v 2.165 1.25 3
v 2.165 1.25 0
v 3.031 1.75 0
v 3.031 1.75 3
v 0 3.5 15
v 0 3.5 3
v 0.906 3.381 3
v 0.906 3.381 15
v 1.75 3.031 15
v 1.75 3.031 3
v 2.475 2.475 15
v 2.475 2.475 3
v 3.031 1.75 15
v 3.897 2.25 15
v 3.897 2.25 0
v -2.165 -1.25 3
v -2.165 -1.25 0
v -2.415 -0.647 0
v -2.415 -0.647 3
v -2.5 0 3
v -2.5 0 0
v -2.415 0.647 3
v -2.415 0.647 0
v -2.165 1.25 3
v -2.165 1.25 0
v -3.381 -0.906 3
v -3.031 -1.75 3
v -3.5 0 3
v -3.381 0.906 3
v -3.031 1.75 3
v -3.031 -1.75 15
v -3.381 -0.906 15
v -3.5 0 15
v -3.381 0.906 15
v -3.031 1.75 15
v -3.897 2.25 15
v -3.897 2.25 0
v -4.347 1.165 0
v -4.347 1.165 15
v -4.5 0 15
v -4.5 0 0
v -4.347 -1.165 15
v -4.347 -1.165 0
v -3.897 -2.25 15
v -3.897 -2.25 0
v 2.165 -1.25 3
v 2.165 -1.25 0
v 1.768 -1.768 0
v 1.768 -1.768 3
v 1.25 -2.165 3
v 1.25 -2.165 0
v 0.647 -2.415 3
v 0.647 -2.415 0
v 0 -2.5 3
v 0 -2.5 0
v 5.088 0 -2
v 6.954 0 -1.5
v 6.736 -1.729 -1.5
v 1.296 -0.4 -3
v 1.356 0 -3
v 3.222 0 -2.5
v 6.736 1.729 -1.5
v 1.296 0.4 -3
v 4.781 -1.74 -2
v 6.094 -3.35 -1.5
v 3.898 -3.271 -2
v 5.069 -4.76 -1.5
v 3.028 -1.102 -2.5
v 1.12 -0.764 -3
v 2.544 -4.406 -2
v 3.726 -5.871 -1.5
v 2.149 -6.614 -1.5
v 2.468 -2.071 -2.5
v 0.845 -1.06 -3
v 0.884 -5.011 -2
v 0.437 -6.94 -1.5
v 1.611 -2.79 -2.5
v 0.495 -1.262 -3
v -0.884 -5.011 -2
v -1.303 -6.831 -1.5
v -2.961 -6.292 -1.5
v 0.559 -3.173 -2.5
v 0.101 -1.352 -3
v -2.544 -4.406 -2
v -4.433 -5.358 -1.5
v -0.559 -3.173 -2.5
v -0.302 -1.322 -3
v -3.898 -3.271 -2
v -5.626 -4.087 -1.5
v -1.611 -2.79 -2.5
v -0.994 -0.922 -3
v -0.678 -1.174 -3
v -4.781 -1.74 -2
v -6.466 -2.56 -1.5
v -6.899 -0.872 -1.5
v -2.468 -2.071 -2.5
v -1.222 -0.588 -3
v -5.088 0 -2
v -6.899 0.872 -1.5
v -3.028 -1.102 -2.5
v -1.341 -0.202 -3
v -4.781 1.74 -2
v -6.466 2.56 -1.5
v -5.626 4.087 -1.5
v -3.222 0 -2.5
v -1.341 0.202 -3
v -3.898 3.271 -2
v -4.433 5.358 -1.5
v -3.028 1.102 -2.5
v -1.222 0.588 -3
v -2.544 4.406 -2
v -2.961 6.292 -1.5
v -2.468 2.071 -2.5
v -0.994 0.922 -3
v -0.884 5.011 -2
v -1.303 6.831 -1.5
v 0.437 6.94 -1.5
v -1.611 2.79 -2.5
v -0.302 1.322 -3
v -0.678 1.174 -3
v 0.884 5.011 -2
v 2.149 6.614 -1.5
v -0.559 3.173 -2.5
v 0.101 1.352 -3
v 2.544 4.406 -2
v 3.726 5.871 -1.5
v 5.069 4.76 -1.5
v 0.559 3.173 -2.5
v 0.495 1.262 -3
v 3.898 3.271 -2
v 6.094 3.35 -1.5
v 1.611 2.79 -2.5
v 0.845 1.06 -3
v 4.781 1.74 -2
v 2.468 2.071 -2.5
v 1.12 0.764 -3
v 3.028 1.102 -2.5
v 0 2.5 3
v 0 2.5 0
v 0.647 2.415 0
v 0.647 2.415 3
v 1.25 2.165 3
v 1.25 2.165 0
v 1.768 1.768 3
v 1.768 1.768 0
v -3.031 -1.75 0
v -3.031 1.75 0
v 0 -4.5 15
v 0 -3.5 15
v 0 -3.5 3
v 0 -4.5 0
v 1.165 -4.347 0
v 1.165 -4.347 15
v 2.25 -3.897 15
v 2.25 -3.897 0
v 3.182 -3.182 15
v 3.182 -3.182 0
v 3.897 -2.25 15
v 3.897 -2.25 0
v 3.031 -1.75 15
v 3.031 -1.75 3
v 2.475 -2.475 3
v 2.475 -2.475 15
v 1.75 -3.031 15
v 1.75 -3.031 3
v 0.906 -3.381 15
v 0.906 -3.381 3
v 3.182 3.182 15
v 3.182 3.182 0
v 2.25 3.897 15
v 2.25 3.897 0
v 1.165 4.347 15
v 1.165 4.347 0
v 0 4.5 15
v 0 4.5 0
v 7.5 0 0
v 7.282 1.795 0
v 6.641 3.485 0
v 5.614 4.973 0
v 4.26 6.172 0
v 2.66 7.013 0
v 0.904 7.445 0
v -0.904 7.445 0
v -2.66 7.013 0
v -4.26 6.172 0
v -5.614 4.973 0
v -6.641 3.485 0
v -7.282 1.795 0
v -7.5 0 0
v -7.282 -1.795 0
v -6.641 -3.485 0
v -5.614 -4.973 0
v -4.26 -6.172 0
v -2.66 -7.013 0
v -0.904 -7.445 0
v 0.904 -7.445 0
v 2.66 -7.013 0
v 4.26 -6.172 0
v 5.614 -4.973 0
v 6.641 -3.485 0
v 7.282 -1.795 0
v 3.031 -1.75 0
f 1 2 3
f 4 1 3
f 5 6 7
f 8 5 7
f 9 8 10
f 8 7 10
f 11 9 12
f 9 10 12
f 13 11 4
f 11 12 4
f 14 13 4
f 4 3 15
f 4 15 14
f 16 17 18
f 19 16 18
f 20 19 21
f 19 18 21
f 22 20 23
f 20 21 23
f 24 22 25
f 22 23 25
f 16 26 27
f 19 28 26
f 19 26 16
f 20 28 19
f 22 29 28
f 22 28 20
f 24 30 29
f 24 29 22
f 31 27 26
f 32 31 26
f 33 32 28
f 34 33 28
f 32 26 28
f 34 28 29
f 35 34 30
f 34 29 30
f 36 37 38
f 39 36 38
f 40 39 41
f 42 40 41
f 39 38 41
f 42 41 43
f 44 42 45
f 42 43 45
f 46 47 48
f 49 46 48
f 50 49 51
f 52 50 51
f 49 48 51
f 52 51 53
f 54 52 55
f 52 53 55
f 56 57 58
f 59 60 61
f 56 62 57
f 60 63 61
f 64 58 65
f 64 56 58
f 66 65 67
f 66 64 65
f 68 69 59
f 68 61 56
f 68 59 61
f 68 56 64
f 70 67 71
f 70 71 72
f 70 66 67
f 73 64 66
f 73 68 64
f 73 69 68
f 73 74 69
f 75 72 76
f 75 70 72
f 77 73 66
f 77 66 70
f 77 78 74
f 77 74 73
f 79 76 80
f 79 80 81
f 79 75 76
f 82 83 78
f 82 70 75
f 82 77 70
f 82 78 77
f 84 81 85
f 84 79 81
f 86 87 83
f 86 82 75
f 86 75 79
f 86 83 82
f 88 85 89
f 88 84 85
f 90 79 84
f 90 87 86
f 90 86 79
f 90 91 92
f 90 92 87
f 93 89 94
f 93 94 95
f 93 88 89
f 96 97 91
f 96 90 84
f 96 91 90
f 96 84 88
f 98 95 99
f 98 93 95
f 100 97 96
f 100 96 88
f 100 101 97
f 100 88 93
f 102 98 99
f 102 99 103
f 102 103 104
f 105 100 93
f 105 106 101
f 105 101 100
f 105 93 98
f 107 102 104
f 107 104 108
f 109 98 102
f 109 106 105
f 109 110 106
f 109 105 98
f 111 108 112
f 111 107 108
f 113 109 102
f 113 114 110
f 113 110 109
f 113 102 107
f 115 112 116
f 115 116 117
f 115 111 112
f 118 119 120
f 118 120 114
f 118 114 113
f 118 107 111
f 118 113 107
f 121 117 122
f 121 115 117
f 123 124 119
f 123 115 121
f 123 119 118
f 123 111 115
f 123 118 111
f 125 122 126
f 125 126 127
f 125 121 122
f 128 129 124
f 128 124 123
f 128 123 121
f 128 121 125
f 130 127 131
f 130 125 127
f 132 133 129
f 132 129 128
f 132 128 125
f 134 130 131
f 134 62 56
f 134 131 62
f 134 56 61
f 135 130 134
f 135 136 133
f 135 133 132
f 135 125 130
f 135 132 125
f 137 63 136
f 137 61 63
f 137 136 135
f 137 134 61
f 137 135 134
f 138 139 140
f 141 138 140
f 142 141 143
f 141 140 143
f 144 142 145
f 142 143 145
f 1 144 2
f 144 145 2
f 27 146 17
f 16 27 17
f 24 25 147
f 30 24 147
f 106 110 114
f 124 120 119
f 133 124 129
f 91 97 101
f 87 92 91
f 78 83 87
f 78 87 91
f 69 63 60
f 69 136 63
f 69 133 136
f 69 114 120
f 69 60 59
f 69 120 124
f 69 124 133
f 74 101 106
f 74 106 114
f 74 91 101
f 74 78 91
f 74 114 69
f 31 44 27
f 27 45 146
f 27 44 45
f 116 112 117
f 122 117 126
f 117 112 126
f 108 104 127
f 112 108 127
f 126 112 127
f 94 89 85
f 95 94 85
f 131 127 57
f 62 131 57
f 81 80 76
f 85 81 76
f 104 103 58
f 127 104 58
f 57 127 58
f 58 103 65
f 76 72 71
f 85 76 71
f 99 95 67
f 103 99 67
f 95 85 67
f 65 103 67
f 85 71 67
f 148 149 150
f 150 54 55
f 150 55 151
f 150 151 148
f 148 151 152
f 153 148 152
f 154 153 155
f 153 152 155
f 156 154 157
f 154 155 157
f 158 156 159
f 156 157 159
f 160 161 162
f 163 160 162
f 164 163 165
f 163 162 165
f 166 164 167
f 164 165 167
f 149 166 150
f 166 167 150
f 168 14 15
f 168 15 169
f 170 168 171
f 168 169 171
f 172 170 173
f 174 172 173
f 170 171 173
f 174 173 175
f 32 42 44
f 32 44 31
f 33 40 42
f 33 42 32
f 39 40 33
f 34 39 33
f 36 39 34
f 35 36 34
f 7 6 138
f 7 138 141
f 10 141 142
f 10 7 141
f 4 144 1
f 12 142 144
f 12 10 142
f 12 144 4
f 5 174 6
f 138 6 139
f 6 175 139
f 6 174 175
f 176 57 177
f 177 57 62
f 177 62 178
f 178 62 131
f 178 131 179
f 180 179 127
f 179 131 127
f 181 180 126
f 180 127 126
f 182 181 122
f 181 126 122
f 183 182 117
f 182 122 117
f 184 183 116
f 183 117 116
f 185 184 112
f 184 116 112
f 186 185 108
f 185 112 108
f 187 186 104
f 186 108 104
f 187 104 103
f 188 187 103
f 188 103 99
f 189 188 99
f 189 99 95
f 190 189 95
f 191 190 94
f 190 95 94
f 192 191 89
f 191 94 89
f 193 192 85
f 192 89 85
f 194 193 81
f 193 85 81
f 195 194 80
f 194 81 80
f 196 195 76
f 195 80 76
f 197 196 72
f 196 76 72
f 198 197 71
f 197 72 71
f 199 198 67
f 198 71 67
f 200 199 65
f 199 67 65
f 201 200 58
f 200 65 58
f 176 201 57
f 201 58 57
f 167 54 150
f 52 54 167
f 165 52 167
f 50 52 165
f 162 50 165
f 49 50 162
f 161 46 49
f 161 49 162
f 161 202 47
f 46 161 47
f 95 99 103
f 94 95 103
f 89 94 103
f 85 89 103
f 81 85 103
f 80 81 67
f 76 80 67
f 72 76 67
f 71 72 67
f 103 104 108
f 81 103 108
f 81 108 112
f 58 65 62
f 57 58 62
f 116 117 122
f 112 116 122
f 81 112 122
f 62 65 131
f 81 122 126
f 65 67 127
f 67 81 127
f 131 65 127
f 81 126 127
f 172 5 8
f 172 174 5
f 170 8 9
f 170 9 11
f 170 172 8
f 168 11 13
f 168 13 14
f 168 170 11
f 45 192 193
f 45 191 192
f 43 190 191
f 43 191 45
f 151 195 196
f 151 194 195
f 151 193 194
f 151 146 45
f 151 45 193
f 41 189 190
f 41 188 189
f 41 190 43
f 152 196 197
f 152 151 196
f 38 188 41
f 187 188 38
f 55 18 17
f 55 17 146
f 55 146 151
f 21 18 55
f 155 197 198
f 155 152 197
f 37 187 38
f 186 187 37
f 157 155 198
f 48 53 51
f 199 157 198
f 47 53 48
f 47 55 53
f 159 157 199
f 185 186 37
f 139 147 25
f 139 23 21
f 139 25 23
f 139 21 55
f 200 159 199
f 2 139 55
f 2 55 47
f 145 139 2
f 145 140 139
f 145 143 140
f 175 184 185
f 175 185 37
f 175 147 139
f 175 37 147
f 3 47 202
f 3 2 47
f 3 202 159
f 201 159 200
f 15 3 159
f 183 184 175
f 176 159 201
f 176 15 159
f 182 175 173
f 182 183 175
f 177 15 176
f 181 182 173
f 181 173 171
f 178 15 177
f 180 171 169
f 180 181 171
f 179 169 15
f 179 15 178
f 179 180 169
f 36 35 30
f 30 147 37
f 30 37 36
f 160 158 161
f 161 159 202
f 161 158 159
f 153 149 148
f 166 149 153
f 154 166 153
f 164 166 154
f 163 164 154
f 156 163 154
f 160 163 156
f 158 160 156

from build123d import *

# Parameters (mm, degrees)
F0_R      = 7.5
F1_DEPTH  = 1.5
F1_TAPER  = 20
F2_DEPTH  = 3
F3_DEPTH  = 15
F1_FACE_R = 6.9540446486
F4_DEPTH  = 1.5
F4_TAPER  = 75


with BuildPart() as f1:
    # F0 (on Top) → F1 (new body)
    with BuildSketch(Plane.XY):
        Circle(F0_R)
        with BuildLine():
            ThreePointArc((0, 4.5), (2.25, 3.897114317), (3.897114317, 2.25))
            ThreePointArc((3.897114317, 2.25), (4.3466662183, 1.164685703), (4.5, 0))
            ThreePointArc((4.5, 0), (4.3466662183, -1.164685703), (3.897114317, -2.25))
            ThreePointArc((3.897114317, -2.25), (2.25, -3.897114317), (0, -4.5))
            ThreePointArc((0, -4.5), (-2.25, -3.897114317), (-3.897114317, -2.25))
            ThreePointArc((-3.897114317, -2.25), (-4.5, 0), (-3.897114317, 2.25))
            ThreePointArc((-3.897114317, 2.25), (-2.25, 3.897114317), (0, 4.5))
        make_face(mode=Mode.SUBTRACT)
        with BuildLine():
            Line((3.897114317, -2.25), (3.0310889132, -1.75))
            ThreePointArc((3.0310889132, -1.75), (1.75, -3.0310889132), (0, -3.5))
            Line((0, -3.5), (0, -4.5))
            ThreePointArc((0, -4.5), (2.25, -3.897114317), (3.897114317, -2.25))
        make_face()
        with BuildLine():
            ThreePointArc((0, -3.5), (1.75, -3.0310889132), (3.0310889132, -1.75))
            Line((3.0310889132, -1.75), (2.1650635095, -1.25))
            ThreePointArc((2.1650635095, -1.25), (1.25, -2.1650635095), (0, -2.5))
            Line((0, -2.5), (0, -3.5))
        make_face()
        with BuildLine():
            ThreePointArc((-3.0310889132, -1.75), (-1.75, -3.0310889132), (0, -3.5))
            Line((0, -3.5), (0, -2.5))
            ThreePointArc((0, -2.5), (-1.25, -2.1650635095), (-2.1650635095, -1.25))
            Line((-2.1650635095, -1.25), (-3.0310889132, -1.75))
        make_face()
        with BuildLine():
            Line((0, -4.5), (0, -3.5))
            ThreePointArc((0, -3.5), (-1.75, -3.0310889132), (-3.0310889132, -1.75))
            Line((-3.0310889132, -1.75), (-3.897114317, -2.25))
            ThreePointArc((-3.897114317, -2.25), (-2.25, -3.897114317), (0, -4.5))
        make_face()
        with BuildLine():
            ThreePointArc((-3.0310889132, -1.75), (-3.5, 0), (-3.0310889132, 1.75))
            Line((-3.0310889132, 1.75), (-3.897114317, 2.25))
            ThreePointArc((-3.897114317, 2.25), (-4.5, 0), (-3.897114317, -2.25))
            Line((-3.897114317, -2.25), (-3.0310889132, -1.75))
        make_face()
        with BuildLine():
            Line((-2.1650635095, 1.25), (-3.0310889132, 1.75))
            ThreePointArc((-3.0310889132, 1.75), (-3.5, 0), (-3.0310889132, -1.75))
            Line((-3.0310889132, -1.75), (-2.1650635095, -1.25))
            ThreePointArc((-2.1650635095, -1.25), (-2.5, 0), (-2.1650635095, 1.25))
        make_face()
        with BuildLine():
            ThreePointArc((-3.0310889132, 1.75), (-1.75, 3.0310889132), (0, 3.5))
            Line((0, 3.5), (0, 4.5))
            ThreePointArc((0, 4.5), (-2.25, 3.897114317), (-3.897114317, 2.25))
            Line((-3.897114317, 2.25), (-3.0310889132, 1.75))
        make_face()
        with BuildLine():
            Line((0, 2.5), (0, 3.5))
            ThreePointArc((0, 3.5), (-1.75, 3.0310889132), (-3.0310889132, 1.75))
            Line((-3.0310889132, 1.75), (-2.1650635095, 1.25))
            ThreePointArc((-2.1650635095, 1.25), (-1.25, 2.1650635095), (0, 2.5))
        make_face()
        with BuildLine():
            ThreePointArc((0, 3.5), (1.75, 3.0310889132), (3.0310889132, 1.75))
            Line((3.0310889132, 1.75), (3.897114317, 2.25))
            ThreePointArc((3.897114317, 2.25), (2.25, 3.897114317), (0, 4.5))
            Line((0, 4.5), (0, 3.5))
        make_face()
        with BuildLine():
            Line((2.1650635095, 1.25), (3.0310889132, 1.75))
            ThreePointArc((3.0310889132, 1.75), (1.75, 3.0310889132), (0, 3.5))
            Line((0, 3.5), (0, 2.5))
            ThreePointArc((0, 2.5), (1.25, 2.1650635095), (2.1650635095, 1.25))
        make_face()
        with BuildLine():
            ThreePointArc((3.0310889132, 1.75), (3.380740392, 0.9058666579), (3.5, 0))
            ThreePointArc((3.5, 0), (3.380740392, -0.9058666579), (3.0310889132, -1.75))
            Line((3.0310889132, -1.75), (3.897114317, -2.25))
            ThreePointArc((3.897114317, -2.25), (4.3466662183, -1.164685703), (4.5, 0))
            ThreePointArc((4.5, 0), (4.3466662183, 1.164685703), (3.897114317, 2.25))
            Line((3.897114317, 2.25), (3.0310889132, 1.75))
        make_face()
        with BuildLine():
            ThreePointArc((3.0310889132, -1.75), (3.380740392, -0.9058666579), (3.5, 0))
            ThreePointArc((3.5, 0), (3.380740392, 0.9058666579), (3.0310889132, 1.75))
            Line((3.0310889132, 1.75), (2.1650635095, 1.25))
            ThreePointArc((2.1650635095, 1.25), (2.4148145657, 0.6470476128), (2.5, 0))
            ThreePointArc((2.5, 0), (2.4148145657, -0.6470476128), (2.1650635095, -1.25))
            Line((2.1650635095, -1.25), (3.0310889132, -1.75))
        make_face()
        with BuildLine():
            ThreePointArc((2.5, 0), (2.4148145657, 0.6470476128), (2.1650635095, 1.25))
            ThreePointArc((2.1650635095, 1.25), (1.25, 2.1650635095), (0, 2.5))
            ThreePointArc((0, 2.5), (-1.25, 2.1650635095), (-2.1650635095, 1.25))
            ThreePointArc((-2.1650635095, 1.25), (-2.5, 0), (-2.1650635095, -1.25))
            ThreePointArc((-2.1650635095, -1.25), (-1.25, -2.1650635095), (0, -2.5))
            ThreePointArc((0, -2.5), (1.25, -2.1650635095), (2.1650635095, -1.25))
            ThreePointArc((2.1650635095, -1.25), (2.4148145657, -0.6470476128), (2.5, 0))
        make_face()
    extrude(amount=-F1_DEPTH, taper=F1_TAPER)

    # F0 (on Top) → F2 (join)
    with BuildSketch(Plane.XY):
        with BuildLine():
            Line((2.1650635095, 1.25), (3.0310889132, 1.75))
            ThreePointArc((3.0310889132, 1.75), (1.75, 3.0310889132), (0, 3.5))
            Line((0, 3.5), (0, 2.5))
            ThreePointArc((0, 2.5), (1.25, 2.1650635095), (2.1650635095, 1.25))
        make_face()
        with BuildLine():
            ThreePointArc((0, -3.5), (1.75, -3.0310889132), (3.0310889132, -1.75))
            Line((3.0310889132, -1.75), (2.1650635095, -1.25))
            ThreePointArc((2.1650635095, -1.25), (1.25, -2.1650635095), (0, -2.5))
            Line((0, -2.5), (0, -3.5))
        make_face()
        with BuildLine():
            Line((-2.1650635095, 1.25), (-3.0310889132, 1.75))
            ThreePointArc((-3.0310889132, 1.75), (-3.5, 0), (-3.0310889132, -1.75))
            Line((-3.0310889132, -1.75), (-2.1650635095, -1.25))
            ThreePointArc((-2.1650635095, -1.25), (-2.5, 0), (-2.1650635095, 1.25))
        make_face()
    extrude(amount=F2_DEPTH)

    # F0 (on Top) → F3 (join)
    with BuildSketch(Plane.XY):
        with BuildLine():
            ThreePointArc((-3.0310889132, -1.75), (-3.5, 0), (-3.0310889132, 1.75))
            Line((-3.0310889132, 1.75), (-3.897114317, 2.25))
            ThreePointArc((-3.897114317, 2.25), (-4.5, 0), (-3.897114317, -2.25))
            Line((-3.897114317, -2.25), (-3.0310889132, -1.75))
        make_face()
        with BuildLine():
            Line((3.897114317, -2.25), (3.0310889132, -1.75))
            ThreePointArc((3.0310889132, -1.75), (1.75, -3.0310889132), (0, -3.5))
            Line((0, -3.5), (0, -4.5))
            ThreePointArc((0, -4.5), (2.25, -3.897114317), (3.897114317, -2.25))
        make_face()
        with BuildLine():
            ThreePointArc((0, 3.5), (1.75, 3.0310889132), (3.0310889132, 1.75))
            Line((3.0310889132, 1.75), (3.897114317, 2.25))
            ThreePointArc((3.897114317, 2.25), (2.25, 3.897114317), (0, 4.5))
            Line((0, 4.5), (0, 3.5))
        make_face()
    extrude(amount=F3_DEPTH)


with BuildPart() as f4:
    # F1_face (on face) → F4 (new body)
    with BuildSketch(Plane(origin=(0, 0, -1.5), x_dir=(1, 0, 0), z_dir=(0, 0, -1))):
        Circle(F1_FACE_R)
    extrude(amount=F4_DEPTH, taper=F4_TAPER)


solid = Compound([f1.part, f4.part])
